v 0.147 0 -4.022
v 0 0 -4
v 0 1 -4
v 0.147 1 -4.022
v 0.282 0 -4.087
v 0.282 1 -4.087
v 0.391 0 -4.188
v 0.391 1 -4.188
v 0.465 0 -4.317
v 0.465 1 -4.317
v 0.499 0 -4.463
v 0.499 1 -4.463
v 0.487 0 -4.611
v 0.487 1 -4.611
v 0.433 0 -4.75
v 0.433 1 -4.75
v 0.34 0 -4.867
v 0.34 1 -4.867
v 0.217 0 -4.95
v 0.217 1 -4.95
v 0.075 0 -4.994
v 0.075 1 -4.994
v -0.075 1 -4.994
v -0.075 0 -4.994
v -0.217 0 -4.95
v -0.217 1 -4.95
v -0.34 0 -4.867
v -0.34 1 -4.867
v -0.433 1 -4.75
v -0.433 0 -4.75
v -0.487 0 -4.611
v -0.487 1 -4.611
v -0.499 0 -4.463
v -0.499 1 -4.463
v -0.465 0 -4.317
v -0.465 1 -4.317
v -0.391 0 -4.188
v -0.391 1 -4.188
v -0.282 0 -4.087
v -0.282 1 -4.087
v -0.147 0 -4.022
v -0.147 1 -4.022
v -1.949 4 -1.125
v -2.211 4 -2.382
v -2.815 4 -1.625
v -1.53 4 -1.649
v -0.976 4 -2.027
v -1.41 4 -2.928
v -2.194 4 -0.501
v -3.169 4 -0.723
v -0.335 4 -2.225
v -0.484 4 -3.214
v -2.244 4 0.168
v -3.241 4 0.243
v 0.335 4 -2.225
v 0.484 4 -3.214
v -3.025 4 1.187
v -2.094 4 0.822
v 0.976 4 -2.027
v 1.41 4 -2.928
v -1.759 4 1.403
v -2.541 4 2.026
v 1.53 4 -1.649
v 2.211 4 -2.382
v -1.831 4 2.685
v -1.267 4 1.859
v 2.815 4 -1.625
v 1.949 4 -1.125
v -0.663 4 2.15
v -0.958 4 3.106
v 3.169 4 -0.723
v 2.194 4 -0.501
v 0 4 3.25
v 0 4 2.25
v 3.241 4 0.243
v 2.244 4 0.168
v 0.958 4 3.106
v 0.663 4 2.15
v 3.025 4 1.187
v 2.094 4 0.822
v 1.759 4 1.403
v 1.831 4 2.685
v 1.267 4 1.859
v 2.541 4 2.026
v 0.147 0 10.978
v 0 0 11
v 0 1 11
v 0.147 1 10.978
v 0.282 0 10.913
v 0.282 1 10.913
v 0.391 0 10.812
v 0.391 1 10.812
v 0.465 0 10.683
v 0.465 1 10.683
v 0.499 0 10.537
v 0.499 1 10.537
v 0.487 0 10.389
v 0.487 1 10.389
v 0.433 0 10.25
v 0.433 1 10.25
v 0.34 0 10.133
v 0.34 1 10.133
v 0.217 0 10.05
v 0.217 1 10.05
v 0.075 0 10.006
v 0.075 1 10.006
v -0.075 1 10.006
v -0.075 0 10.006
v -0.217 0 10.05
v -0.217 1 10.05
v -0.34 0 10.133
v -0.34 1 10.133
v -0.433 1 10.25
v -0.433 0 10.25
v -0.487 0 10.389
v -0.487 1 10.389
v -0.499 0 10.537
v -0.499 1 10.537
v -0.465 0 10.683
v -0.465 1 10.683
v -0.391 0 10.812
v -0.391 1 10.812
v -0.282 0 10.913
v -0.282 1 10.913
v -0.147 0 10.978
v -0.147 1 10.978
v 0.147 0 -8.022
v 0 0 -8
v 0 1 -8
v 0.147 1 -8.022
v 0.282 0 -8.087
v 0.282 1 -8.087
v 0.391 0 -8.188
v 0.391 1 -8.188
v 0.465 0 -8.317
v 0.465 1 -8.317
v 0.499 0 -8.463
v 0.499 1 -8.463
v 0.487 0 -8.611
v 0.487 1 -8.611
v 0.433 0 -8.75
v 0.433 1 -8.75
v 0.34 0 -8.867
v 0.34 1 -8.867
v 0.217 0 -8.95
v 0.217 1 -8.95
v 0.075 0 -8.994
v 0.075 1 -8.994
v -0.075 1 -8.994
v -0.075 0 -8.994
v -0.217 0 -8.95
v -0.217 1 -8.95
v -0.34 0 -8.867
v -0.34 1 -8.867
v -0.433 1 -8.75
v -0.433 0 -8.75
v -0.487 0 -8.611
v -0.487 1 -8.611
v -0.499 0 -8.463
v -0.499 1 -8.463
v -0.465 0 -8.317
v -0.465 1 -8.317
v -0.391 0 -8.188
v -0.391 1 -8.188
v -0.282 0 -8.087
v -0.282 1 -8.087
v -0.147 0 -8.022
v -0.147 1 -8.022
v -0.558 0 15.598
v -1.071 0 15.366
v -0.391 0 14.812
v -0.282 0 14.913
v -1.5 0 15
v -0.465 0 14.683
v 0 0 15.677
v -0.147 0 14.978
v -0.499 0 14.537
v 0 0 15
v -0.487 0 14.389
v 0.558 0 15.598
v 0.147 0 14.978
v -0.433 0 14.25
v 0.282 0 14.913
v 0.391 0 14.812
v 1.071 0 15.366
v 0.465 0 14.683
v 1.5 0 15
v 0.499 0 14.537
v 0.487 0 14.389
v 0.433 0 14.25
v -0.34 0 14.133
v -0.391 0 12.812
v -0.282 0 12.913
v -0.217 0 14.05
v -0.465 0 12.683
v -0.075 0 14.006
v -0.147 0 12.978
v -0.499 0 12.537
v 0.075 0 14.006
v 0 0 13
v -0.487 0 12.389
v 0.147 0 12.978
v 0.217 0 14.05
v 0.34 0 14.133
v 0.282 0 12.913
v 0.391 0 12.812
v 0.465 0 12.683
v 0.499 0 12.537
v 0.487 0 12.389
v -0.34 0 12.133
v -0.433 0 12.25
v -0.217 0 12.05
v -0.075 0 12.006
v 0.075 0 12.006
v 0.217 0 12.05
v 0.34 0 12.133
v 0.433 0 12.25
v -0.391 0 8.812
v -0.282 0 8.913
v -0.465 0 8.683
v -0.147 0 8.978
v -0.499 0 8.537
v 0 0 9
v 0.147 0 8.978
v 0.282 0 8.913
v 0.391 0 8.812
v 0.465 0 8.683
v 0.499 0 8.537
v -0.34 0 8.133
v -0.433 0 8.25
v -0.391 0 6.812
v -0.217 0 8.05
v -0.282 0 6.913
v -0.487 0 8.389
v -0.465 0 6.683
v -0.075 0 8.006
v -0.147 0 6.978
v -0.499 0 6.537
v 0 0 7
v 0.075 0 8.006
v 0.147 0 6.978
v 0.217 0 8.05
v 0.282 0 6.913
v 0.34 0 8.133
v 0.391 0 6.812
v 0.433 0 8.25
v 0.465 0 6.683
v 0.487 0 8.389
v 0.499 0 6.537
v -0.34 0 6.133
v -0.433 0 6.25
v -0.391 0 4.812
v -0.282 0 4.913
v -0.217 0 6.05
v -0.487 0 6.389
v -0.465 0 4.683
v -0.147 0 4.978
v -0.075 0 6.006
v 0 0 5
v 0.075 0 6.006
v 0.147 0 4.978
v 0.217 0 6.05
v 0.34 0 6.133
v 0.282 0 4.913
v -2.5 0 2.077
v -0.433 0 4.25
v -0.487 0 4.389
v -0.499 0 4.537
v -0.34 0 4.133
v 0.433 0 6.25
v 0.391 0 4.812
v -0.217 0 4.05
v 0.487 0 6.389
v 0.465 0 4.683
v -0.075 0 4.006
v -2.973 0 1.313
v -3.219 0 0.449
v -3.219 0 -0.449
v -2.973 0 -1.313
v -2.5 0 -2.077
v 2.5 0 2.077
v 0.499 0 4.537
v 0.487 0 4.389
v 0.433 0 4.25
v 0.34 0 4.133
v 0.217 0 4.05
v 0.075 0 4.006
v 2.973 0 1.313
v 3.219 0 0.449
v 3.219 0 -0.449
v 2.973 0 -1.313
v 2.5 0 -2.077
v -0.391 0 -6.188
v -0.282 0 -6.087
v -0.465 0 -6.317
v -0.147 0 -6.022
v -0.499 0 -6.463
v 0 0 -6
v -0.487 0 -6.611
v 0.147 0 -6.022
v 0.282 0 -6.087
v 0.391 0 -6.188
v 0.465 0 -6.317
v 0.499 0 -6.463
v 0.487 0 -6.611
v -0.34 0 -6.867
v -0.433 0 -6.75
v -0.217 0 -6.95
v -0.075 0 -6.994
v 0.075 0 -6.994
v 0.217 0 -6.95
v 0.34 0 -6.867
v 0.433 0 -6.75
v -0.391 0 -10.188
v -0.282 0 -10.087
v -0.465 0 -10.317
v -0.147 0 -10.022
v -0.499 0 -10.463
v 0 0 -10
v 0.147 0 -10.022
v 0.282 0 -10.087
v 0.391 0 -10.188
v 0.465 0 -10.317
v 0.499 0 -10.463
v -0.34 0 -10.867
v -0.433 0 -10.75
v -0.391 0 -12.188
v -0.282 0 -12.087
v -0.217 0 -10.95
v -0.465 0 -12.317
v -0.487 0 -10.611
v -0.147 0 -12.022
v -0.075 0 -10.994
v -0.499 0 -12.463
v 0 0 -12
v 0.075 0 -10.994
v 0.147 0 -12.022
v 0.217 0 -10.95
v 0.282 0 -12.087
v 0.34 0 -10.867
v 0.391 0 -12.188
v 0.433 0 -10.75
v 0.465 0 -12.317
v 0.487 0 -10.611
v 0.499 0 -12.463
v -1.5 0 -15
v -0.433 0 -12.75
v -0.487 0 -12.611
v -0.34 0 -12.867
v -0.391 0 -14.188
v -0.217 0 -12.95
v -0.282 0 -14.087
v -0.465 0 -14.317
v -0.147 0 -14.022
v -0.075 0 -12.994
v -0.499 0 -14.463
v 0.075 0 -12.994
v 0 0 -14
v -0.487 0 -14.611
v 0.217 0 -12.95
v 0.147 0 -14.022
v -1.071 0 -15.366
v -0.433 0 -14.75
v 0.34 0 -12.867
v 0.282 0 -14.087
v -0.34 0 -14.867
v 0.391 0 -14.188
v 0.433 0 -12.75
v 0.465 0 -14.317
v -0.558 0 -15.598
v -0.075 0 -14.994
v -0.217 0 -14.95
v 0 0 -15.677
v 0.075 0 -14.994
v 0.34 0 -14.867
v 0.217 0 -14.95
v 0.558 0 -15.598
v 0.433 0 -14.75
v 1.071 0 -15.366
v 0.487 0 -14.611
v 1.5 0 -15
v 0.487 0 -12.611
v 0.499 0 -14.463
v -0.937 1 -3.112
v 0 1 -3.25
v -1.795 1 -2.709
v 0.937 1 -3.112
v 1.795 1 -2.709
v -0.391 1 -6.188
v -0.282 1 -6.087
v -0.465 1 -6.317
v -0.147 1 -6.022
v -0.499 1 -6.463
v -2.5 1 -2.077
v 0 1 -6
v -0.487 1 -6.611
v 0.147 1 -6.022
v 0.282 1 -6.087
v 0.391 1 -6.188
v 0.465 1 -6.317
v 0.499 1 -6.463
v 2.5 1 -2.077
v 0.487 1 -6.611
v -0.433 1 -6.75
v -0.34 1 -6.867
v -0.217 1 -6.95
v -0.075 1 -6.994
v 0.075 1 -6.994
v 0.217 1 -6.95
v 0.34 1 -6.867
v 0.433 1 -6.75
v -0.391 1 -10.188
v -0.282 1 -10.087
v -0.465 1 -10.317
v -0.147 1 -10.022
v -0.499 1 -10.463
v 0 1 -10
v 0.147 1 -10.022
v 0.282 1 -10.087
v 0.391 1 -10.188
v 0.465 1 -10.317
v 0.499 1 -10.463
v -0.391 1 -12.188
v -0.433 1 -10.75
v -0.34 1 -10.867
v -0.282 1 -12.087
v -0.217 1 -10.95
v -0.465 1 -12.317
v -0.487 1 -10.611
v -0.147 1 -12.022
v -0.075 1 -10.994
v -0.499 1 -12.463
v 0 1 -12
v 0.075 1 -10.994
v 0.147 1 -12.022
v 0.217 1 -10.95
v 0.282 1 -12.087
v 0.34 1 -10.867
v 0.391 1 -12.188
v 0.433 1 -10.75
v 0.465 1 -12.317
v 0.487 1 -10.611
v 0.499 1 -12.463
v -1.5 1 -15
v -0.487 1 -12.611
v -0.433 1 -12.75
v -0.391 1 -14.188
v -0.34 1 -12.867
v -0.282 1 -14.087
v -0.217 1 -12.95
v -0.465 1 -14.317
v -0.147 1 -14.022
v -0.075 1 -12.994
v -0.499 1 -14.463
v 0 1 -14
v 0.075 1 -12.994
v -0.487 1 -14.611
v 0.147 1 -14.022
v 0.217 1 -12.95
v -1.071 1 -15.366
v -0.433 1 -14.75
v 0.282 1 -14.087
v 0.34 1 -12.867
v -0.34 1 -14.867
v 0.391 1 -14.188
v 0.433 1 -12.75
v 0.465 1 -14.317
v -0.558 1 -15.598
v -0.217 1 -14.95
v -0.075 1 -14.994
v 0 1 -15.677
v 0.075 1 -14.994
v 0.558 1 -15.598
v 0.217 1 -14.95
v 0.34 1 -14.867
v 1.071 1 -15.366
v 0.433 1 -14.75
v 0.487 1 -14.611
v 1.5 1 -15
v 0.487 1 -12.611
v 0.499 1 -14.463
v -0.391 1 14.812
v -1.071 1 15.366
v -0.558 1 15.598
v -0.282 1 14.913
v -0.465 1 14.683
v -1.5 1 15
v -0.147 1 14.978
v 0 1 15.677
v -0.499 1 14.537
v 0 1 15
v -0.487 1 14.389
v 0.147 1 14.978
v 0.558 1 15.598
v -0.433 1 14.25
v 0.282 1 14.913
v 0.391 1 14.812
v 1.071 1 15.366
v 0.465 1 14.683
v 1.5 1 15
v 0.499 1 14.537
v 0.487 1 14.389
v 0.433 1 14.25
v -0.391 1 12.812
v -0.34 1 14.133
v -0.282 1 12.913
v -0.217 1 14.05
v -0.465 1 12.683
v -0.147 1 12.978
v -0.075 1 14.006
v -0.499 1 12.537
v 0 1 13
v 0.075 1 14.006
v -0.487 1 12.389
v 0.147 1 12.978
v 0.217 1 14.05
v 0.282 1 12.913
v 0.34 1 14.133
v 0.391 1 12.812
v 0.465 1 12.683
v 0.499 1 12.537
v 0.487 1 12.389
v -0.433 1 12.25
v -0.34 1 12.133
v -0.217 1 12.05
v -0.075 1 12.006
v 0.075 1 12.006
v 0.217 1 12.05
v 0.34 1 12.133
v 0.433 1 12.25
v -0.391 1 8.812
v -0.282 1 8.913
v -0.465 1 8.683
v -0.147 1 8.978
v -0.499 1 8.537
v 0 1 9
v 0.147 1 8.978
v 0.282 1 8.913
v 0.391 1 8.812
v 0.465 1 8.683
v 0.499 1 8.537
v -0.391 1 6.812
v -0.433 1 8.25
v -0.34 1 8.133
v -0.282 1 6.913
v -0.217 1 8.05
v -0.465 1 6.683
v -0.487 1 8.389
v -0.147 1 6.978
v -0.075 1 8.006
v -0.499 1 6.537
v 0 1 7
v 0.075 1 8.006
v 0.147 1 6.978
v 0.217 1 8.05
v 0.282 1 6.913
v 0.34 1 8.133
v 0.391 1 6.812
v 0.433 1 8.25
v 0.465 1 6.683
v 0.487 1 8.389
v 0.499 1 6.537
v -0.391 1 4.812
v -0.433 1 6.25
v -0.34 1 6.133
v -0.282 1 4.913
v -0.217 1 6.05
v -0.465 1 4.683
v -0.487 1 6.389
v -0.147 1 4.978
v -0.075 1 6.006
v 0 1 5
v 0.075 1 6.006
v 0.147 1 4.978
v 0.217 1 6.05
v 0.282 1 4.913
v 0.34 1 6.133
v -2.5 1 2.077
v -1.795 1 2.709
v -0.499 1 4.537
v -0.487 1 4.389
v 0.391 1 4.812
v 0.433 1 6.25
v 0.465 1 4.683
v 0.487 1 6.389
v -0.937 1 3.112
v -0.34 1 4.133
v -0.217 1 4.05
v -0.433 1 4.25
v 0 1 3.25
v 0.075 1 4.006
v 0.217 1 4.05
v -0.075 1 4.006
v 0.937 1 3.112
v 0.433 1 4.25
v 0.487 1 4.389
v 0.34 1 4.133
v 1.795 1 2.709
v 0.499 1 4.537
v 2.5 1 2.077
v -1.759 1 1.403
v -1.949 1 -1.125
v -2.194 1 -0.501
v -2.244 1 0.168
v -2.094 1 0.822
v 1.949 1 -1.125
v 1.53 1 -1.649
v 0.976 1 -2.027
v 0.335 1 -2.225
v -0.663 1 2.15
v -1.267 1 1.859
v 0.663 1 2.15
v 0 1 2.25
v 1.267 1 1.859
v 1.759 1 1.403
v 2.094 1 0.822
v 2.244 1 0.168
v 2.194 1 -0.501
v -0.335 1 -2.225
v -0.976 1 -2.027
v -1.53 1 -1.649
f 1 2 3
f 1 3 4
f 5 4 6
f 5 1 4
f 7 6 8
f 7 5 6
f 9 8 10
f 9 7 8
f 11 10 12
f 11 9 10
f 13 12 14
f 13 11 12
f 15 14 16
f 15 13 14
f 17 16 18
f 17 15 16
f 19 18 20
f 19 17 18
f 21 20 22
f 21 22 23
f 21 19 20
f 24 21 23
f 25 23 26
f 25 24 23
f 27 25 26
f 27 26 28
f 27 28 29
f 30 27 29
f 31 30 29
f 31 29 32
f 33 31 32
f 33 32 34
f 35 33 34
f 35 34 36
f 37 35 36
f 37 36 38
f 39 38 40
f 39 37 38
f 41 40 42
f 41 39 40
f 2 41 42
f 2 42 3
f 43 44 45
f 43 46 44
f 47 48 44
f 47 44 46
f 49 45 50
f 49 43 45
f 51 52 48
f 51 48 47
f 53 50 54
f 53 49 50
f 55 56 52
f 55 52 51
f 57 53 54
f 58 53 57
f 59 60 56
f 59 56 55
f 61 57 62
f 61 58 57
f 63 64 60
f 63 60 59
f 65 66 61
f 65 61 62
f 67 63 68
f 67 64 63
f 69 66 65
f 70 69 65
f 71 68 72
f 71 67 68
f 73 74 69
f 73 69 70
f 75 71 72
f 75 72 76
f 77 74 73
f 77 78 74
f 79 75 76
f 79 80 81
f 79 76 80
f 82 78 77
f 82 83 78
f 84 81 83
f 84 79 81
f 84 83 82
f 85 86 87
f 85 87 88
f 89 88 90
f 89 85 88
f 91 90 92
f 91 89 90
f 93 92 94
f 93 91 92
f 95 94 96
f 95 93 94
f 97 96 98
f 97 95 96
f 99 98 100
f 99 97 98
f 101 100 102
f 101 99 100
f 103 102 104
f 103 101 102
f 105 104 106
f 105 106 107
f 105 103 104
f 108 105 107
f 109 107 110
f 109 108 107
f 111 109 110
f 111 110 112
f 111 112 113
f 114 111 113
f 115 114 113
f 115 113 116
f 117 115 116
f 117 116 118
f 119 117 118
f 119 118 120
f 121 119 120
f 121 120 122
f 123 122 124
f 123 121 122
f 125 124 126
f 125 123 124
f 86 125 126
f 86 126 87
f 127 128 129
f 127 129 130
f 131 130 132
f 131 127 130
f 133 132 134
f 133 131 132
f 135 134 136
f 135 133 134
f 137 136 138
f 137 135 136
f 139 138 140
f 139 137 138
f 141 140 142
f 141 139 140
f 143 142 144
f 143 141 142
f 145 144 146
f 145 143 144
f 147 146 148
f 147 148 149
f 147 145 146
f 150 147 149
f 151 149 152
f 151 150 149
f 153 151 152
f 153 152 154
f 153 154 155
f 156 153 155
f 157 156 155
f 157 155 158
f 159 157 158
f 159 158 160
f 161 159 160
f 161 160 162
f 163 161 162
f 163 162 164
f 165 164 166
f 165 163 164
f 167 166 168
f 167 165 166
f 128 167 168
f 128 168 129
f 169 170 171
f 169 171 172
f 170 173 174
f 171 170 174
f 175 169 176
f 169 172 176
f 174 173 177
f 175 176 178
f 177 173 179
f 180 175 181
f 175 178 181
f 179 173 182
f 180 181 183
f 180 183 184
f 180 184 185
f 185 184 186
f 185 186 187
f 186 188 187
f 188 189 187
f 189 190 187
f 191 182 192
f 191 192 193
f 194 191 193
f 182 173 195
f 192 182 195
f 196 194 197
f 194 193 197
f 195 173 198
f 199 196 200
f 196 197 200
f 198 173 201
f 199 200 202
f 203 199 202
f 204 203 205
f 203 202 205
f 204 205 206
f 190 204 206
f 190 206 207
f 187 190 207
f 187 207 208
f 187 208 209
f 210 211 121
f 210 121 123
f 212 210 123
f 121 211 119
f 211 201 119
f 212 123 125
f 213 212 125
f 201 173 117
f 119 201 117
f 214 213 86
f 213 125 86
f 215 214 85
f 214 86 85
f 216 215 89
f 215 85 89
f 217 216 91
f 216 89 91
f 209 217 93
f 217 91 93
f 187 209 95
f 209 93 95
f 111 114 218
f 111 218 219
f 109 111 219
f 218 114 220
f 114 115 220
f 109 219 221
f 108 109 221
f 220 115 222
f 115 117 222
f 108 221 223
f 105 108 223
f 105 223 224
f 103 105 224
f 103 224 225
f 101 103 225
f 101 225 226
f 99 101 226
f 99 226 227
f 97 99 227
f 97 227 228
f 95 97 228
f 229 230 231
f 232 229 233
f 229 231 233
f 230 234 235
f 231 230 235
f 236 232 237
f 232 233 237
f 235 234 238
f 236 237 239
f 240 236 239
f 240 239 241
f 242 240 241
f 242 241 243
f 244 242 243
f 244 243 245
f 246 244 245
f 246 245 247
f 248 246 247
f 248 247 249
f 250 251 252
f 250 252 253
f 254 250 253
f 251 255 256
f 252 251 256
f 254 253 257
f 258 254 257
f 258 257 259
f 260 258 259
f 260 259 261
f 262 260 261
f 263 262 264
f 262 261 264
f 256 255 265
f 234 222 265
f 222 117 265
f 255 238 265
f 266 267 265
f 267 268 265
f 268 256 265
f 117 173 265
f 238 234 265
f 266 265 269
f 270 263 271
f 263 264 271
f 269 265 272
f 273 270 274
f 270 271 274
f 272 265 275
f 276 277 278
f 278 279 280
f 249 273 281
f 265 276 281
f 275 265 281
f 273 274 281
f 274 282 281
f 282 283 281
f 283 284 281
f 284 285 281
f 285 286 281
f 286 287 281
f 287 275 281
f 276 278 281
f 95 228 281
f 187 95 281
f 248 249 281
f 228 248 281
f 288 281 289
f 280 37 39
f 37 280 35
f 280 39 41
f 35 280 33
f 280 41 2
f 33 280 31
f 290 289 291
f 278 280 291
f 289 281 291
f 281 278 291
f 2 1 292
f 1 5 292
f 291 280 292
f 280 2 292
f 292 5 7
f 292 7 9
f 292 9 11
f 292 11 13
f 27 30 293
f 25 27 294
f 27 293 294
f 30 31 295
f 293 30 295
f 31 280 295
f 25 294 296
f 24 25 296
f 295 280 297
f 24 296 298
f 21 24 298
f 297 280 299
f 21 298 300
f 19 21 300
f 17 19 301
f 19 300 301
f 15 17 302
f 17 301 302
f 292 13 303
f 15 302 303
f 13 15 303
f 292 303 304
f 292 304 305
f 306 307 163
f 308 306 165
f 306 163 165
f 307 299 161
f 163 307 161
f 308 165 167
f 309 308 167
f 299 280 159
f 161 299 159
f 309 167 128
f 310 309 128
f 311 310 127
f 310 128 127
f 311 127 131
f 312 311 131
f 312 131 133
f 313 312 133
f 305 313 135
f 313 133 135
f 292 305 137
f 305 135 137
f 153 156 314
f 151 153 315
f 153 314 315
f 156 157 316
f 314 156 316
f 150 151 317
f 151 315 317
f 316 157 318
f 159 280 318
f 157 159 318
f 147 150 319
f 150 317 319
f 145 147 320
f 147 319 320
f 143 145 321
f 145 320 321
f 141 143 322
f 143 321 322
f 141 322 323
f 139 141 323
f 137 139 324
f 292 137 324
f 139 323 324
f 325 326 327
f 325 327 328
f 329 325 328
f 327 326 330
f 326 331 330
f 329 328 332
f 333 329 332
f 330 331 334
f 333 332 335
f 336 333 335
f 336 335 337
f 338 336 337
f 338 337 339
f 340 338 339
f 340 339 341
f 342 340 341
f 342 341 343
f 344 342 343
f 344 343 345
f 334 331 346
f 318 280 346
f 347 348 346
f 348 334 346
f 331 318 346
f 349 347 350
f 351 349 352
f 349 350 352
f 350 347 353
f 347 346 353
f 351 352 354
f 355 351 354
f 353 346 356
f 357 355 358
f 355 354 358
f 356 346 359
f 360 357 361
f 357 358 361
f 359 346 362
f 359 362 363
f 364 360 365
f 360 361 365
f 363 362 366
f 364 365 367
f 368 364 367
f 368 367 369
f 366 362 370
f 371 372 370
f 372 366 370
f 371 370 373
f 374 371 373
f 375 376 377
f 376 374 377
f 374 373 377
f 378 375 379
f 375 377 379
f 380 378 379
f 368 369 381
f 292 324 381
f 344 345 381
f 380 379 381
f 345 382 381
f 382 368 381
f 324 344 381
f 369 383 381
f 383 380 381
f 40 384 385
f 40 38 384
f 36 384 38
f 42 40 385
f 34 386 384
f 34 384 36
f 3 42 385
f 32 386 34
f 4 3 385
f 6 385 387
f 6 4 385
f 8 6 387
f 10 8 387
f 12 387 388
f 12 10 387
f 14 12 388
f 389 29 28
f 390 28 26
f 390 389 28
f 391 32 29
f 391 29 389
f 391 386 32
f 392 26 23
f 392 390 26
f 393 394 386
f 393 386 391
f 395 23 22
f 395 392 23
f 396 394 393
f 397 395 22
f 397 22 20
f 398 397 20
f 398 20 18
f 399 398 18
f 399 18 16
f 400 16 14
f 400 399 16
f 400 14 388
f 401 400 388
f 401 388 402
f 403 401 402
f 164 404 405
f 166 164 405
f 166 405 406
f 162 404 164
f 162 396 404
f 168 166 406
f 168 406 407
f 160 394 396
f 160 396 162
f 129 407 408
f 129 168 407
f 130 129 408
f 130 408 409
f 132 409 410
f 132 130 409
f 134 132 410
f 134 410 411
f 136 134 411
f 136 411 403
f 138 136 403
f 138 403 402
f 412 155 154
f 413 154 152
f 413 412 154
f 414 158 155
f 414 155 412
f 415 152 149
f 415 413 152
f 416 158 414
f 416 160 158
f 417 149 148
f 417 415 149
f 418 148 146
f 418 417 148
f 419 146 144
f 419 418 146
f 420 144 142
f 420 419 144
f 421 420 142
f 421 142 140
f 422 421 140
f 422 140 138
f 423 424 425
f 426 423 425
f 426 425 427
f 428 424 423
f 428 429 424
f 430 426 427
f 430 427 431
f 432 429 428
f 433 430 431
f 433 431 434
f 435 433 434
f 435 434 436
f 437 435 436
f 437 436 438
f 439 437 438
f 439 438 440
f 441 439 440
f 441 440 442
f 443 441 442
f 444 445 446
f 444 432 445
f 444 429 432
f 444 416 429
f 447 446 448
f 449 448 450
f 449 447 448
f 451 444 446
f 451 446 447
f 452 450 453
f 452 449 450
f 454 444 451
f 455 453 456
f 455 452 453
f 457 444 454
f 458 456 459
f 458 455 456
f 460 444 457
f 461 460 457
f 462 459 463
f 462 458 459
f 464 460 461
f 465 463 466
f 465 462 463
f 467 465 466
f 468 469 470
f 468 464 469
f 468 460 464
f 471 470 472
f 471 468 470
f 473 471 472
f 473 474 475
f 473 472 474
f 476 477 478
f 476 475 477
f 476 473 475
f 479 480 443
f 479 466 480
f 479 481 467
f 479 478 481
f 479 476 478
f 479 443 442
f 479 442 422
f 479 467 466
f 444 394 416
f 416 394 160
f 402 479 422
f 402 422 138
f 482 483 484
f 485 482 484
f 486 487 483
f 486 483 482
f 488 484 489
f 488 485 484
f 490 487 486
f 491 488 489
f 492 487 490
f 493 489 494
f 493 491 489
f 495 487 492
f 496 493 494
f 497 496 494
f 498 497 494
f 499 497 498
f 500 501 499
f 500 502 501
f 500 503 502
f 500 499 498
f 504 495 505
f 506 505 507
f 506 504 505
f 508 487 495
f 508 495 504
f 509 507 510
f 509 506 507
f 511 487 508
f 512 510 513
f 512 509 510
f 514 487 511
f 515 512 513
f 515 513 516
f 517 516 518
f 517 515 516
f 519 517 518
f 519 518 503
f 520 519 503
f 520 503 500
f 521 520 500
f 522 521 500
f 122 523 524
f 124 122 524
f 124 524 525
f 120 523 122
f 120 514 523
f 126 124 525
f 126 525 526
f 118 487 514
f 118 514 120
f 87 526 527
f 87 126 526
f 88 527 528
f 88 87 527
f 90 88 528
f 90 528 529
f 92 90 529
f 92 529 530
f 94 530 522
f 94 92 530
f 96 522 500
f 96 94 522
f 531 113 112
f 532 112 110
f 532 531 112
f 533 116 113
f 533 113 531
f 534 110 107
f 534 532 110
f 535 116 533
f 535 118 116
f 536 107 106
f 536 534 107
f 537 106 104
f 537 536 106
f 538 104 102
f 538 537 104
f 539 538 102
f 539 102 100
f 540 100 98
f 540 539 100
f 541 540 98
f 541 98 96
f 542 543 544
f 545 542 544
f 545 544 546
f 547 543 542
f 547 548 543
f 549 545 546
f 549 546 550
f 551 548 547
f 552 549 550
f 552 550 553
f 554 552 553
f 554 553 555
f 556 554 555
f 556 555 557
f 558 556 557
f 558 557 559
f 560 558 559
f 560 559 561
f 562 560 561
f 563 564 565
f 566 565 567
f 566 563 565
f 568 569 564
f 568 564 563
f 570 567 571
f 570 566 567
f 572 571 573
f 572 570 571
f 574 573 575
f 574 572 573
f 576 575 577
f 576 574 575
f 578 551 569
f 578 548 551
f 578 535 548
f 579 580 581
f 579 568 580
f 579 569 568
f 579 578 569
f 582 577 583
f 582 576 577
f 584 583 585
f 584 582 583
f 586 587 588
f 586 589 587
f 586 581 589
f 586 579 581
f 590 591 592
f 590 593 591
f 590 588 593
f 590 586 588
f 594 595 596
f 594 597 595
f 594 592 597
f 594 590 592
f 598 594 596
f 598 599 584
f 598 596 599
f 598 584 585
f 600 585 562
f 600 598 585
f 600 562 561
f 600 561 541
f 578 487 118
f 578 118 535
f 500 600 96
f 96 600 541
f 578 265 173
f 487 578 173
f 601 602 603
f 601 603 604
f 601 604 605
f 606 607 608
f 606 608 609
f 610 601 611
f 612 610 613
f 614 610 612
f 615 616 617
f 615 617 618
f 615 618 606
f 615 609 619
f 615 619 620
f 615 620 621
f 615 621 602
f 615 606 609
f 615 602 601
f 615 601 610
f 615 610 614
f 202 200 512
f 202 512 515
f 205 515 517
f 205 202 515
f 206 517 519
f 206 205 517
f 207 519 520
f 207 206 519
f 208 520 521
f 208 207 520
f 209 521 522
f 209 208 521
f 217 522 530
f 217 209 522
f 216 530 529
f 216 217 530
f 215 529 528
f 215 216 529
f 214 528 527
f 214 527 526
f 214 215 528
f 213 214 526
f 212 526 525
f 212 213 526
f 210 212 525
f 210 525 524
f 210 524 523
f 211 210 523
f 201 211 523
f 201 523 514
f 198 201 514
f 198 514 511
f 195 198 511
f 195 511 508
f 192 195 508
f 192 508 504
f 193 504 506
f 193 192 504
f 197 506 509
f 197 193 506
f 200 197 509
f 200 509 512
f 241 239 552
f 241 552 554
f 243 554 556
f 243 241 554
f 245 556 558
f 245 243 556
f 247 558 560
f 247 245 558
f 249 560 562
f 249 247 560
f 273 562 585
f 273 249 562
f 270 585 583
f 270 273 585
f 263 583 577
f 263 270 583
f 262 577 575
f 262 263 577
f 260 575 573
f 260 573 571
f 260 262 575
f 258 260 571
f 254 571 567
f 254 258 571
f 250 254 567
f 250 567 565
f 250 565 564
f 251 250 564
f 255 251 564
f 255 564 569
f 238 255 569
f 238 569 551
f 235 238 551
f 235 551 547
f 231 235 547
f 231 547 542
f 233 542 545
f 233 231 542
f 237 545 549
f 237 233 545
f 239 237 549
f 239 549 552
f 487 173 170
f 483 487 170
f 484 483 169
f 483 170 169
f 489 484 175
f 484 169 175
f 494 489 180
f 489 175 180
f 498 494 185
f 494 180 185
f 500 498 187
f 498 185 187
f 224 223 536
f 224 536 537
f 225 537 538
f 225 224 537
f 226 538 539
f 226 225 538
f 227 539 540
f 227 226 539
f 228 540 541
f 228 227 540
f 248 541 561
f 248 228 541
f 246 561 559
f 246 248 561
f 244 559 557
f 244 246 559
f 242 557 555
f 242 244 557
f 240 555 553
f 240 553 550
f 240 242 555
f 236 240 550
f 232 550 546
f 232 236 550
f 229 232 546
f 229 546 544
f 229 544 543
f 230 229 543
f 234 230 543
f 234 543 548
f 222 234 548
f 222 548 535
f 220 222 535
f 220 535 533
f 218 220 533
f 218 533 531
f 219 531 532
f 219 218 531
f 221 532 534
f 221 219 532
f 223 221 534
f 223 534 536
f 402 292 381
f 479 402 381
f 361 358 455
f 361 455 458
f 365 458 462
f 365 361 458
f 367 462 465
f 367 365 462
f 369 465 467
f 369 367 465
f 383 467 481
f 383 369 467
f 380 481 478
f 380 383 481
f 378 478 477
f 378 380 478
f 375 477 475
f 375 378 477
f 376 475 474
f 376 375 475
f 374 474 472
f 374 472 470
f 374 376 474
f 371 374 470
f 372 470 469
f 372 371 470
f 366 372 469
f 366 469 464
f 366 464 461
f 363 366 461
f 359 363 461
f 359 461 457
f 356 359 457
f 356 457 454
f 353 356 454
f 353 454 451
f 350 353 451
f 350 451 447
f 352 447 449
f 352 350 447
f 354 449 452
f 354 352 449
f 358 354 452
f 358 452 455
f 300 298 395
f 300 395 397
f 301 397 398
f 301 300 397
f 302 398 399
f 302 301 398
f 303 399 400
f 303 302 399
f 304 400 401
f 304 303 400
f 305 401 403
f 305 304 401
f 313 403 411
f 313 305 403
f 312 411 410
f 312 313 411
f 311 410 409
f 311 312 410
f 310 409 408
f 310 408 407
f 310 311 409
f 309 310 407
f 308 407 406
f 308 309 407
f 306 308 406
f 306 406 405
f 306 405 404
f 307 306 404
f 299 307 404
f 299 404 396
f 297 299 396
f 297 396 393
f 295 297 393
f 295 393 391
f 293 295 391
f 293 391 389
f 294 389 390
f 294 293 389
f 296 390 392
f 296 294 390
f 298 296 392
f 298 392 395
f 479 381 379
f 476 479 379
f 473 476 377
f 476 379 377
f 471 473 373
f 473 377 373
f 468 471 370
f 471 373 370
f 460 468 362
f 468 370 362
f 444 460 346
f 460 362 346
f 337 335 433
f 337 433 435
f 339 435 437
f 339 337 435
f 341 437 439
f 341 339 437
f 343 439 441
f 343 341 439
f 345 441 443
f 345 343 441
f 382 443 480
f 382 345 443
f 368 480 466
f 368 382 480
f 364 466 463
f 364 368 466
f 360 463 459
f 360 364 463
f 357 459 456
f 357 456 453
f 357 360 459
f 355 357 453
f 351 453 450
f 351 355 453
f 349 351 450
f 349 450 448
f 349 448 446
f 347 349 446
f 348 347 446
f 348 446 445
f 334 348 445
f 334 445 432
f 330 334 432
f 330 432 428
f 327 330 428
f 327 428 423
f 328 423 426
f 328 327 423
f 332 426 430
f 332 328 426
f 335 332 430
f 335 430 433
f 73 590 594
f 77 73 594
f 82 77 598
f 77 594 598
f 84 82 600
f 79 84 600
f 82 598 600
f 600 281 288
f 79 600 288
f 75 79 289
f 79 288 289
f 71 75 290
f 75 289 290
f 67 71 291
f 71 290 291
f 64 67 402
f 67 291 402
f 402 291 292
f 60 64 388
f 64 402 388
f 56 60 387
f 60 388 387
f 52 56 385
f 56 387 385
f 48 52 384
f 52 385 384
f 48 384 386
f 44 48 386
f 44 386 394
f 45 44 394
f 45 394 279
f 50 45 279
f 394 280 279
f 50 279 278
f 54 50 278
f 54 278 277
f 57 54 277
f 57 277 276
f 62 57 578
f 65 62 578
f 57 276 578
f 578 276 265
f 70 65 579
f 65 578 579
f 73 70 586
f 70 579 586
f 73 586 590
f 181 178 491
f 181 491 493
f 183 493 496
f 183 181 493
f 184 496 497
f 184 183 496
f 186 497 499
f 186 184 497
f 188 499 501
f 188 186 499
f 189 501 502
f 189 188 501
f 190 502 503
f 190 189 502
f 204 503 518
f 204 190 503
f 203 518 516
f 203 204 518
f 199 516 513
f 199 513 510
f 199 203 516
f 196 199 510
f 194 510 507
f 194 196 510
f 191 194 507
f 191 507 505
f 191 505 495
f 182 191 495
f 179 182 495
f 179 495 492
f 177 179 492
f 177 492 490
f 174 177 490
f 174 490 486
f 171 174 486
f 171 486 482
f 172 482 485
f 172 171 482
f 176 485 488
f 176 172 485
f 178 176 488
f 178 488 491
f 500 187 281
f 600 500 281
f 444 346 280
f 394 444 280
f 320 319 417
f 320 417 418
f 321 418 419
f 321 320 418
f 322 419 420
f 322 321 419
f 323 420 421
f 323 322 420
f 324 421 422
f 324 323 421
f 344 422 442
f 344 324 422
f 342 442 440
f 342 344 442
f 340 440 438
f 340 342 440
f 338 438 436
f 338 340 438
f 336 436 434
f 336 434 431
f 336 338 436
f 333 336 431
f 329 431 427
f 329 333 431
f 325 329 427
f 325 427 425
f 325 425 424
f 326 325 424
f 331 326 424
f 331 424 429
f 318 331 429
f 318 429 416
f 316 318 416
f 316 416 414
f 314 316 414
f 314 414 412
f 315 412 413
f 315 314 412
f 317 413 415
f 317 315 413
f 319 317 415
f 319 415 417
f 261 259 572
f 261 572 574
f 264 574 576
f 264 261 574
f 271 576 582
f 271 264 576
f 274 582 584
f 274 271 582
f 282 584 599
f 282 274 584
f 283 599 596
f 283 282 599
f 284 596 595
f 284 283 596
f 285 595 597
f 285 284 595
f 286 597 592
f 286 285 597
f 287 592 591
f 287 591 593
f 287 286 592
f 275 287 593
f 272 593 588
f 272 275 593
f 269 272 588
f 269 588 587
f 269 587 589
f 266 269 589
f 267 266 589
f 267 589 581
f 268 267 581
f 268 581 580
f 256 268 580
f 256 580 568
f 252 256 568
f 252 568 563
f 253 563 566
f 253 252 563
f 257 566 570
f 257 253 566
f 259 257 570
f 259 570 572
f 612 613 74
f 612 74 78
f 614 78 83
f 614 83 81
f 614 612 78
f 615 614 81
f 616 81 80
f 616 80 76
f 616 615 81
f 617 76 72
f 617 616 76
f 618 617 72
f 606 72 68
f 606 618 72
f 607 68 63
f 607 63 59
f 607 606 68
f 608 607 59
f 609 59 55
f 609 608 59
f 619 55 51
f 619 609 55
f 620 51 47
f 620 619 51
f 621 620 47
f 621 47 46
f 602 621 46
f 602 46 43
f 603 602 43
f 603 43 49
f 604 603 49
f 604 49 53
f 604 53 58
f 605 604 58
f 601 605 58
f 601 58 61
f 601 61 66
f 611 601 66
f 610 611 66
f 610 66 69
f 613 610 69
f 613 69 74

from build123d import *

# Parameters (mm, degrees)
SKETCH_1_R      = 2.25
EXTRUDE_1_DEPTH = 4
SKETCH_1_3_R    = 2.25
EXTRUDE_2_DEPTH = 1
SKETCH_1_4_R    = 0.5
EXTRUDE_3_DEPTH = 1
SKETCH_1_5_R    = 0.5
EXTRUDE_4_DEPTH = 1


with BuildPart() as part:
    # 草图1 → 凸台-拉伸1 (new body)
    with BuildSketch(Plane(origin=(0, 0, 0), x_dir=(1, 0, 0), z_dir=(0, 1, 0))):
        with BuildLine():
            ThreePointArc((2.5, 2.076655966), (0, 3.25), (-2.5, 2.076655966))
            ThreePointArc((-2.5, 2.076655966), (-3.25, 0), (-2.5, -2.076655966))
            ThreePointArc((-2.5, -2.076655966), (0, -3.25), (2.5, -2.076655966))
            ThreePointArc((2.5, -2.076655966), (3.056754815, -1.103970108), (3.25, 0))
            ThreePointArc((3.25, 0), (3.056754815, 1.103970108), (2.5, 2.076655966))
        make_face()
        Circle(SKETCH_1_R, mode=Mode.SUBTRACT)
    extrude(amount=EXTRUDE_1_DEPTH)

    # 草图1<3> → 凸台-拉伸2 (add)
    with BuildSketch(Plane(origin=(0, 0, 0), x_dir=(1, 0, 0), z_dir=(0, 1, 0))):
        Circle(SKETCH_1_3_R)
    extrude(amount=EXTRUDE_2_DEPTH)

    # 草图1<4> → 凸台-拉伸3 (add)
    with BuildSketch(Plane(origin=(0, 0, 0), x_dir=(1, 0, 0), z_dir=(0, 1, 0))):
        with BuildLine():
            ThreePointArc((1.5, 15), (0, 15.677124344), (-1.5, 15))
            Line((-1.5, 15), (-2.5, 2.076655966))
            ThreePointArc((-2.5, 2.076655966), (0, 3.25), (2.5, 2.076655966))
            Line((2.5, 2.076655966), (1.5, 15))
        make_face()
        with Locations((0, 4.5)):
            Circle(SKETCH_1_4_R, mode=Mode.SUBTRACT)
        with Locations((0, 6.5)):
            Circle(SKETCH_1_4_R, mode=Mode.SUBTRACT)
        with Locations((0, 8.5)):
            Circle(SKETCH_1_4_R, mode=Mode.SUBTRACT)
        with Locations((0, 10.5)):
            Circle(SKETCH_1_4_R, mode=Mode.SUBTRACT)
        with Locations((0, 12.5)):
            Circle(SKETCH_1_4_R, mode=Mode.SUBTRACT)
        with Locations((0, 14.5)):
            Circle(SKETCH_1_4_R, mode=Mode.SUBTRACT)
    extrude(amount=EXTRUDE_3_DEPTH)

    # 草图1<5> → 凸台-拉伸4 (add)
    with BuildSketch(Plane(origin=(0, 0, 0), x_dir=(1, 0, 0), z_dir=(0, 1, 0))):
        with BuildLine():
            ThreePointArc((2.5, -2.076655966), (0, -3.25), (-2.5, -2.076655966))
            Line((-2.5, -2.076655966), (-1.5, -15))
            ThreePointArc((-1.5, -15), (0, -15.677124344), (1.5, -15))
            Line((1.5, -15), (2.5, -2.076655966))
        make_face()
        with Locations((0, -14.5)):
            Circle(SKETCH_1_5_R, mode=Mode.SUBTRACT)
        with Locations((0, -12.5)):
            Circle(SKETCH_1_5_R, mode=Mode.SUBTRACT)
        with Locations((0, -10.5)):
            Circle(SKETCH_1_5_R, mode=Mode.SUBTRACT)
        with Locations((0, -8.5)):
            Circle(SKETCH_1_5_R, mode=Mode.SUBTRACT)
        with Locations((0, -6.5)):
            Circle(SKETCH_1_5_R, mode=Mode.SUBTRACT)
        with Locations((0, -4.5)):
            Circle(SKETCH_1_5_R, mode=Mode.SUBTRACT)
    extrude(amount=EXTRUDE_4_DEPTH)


solid = part.part
